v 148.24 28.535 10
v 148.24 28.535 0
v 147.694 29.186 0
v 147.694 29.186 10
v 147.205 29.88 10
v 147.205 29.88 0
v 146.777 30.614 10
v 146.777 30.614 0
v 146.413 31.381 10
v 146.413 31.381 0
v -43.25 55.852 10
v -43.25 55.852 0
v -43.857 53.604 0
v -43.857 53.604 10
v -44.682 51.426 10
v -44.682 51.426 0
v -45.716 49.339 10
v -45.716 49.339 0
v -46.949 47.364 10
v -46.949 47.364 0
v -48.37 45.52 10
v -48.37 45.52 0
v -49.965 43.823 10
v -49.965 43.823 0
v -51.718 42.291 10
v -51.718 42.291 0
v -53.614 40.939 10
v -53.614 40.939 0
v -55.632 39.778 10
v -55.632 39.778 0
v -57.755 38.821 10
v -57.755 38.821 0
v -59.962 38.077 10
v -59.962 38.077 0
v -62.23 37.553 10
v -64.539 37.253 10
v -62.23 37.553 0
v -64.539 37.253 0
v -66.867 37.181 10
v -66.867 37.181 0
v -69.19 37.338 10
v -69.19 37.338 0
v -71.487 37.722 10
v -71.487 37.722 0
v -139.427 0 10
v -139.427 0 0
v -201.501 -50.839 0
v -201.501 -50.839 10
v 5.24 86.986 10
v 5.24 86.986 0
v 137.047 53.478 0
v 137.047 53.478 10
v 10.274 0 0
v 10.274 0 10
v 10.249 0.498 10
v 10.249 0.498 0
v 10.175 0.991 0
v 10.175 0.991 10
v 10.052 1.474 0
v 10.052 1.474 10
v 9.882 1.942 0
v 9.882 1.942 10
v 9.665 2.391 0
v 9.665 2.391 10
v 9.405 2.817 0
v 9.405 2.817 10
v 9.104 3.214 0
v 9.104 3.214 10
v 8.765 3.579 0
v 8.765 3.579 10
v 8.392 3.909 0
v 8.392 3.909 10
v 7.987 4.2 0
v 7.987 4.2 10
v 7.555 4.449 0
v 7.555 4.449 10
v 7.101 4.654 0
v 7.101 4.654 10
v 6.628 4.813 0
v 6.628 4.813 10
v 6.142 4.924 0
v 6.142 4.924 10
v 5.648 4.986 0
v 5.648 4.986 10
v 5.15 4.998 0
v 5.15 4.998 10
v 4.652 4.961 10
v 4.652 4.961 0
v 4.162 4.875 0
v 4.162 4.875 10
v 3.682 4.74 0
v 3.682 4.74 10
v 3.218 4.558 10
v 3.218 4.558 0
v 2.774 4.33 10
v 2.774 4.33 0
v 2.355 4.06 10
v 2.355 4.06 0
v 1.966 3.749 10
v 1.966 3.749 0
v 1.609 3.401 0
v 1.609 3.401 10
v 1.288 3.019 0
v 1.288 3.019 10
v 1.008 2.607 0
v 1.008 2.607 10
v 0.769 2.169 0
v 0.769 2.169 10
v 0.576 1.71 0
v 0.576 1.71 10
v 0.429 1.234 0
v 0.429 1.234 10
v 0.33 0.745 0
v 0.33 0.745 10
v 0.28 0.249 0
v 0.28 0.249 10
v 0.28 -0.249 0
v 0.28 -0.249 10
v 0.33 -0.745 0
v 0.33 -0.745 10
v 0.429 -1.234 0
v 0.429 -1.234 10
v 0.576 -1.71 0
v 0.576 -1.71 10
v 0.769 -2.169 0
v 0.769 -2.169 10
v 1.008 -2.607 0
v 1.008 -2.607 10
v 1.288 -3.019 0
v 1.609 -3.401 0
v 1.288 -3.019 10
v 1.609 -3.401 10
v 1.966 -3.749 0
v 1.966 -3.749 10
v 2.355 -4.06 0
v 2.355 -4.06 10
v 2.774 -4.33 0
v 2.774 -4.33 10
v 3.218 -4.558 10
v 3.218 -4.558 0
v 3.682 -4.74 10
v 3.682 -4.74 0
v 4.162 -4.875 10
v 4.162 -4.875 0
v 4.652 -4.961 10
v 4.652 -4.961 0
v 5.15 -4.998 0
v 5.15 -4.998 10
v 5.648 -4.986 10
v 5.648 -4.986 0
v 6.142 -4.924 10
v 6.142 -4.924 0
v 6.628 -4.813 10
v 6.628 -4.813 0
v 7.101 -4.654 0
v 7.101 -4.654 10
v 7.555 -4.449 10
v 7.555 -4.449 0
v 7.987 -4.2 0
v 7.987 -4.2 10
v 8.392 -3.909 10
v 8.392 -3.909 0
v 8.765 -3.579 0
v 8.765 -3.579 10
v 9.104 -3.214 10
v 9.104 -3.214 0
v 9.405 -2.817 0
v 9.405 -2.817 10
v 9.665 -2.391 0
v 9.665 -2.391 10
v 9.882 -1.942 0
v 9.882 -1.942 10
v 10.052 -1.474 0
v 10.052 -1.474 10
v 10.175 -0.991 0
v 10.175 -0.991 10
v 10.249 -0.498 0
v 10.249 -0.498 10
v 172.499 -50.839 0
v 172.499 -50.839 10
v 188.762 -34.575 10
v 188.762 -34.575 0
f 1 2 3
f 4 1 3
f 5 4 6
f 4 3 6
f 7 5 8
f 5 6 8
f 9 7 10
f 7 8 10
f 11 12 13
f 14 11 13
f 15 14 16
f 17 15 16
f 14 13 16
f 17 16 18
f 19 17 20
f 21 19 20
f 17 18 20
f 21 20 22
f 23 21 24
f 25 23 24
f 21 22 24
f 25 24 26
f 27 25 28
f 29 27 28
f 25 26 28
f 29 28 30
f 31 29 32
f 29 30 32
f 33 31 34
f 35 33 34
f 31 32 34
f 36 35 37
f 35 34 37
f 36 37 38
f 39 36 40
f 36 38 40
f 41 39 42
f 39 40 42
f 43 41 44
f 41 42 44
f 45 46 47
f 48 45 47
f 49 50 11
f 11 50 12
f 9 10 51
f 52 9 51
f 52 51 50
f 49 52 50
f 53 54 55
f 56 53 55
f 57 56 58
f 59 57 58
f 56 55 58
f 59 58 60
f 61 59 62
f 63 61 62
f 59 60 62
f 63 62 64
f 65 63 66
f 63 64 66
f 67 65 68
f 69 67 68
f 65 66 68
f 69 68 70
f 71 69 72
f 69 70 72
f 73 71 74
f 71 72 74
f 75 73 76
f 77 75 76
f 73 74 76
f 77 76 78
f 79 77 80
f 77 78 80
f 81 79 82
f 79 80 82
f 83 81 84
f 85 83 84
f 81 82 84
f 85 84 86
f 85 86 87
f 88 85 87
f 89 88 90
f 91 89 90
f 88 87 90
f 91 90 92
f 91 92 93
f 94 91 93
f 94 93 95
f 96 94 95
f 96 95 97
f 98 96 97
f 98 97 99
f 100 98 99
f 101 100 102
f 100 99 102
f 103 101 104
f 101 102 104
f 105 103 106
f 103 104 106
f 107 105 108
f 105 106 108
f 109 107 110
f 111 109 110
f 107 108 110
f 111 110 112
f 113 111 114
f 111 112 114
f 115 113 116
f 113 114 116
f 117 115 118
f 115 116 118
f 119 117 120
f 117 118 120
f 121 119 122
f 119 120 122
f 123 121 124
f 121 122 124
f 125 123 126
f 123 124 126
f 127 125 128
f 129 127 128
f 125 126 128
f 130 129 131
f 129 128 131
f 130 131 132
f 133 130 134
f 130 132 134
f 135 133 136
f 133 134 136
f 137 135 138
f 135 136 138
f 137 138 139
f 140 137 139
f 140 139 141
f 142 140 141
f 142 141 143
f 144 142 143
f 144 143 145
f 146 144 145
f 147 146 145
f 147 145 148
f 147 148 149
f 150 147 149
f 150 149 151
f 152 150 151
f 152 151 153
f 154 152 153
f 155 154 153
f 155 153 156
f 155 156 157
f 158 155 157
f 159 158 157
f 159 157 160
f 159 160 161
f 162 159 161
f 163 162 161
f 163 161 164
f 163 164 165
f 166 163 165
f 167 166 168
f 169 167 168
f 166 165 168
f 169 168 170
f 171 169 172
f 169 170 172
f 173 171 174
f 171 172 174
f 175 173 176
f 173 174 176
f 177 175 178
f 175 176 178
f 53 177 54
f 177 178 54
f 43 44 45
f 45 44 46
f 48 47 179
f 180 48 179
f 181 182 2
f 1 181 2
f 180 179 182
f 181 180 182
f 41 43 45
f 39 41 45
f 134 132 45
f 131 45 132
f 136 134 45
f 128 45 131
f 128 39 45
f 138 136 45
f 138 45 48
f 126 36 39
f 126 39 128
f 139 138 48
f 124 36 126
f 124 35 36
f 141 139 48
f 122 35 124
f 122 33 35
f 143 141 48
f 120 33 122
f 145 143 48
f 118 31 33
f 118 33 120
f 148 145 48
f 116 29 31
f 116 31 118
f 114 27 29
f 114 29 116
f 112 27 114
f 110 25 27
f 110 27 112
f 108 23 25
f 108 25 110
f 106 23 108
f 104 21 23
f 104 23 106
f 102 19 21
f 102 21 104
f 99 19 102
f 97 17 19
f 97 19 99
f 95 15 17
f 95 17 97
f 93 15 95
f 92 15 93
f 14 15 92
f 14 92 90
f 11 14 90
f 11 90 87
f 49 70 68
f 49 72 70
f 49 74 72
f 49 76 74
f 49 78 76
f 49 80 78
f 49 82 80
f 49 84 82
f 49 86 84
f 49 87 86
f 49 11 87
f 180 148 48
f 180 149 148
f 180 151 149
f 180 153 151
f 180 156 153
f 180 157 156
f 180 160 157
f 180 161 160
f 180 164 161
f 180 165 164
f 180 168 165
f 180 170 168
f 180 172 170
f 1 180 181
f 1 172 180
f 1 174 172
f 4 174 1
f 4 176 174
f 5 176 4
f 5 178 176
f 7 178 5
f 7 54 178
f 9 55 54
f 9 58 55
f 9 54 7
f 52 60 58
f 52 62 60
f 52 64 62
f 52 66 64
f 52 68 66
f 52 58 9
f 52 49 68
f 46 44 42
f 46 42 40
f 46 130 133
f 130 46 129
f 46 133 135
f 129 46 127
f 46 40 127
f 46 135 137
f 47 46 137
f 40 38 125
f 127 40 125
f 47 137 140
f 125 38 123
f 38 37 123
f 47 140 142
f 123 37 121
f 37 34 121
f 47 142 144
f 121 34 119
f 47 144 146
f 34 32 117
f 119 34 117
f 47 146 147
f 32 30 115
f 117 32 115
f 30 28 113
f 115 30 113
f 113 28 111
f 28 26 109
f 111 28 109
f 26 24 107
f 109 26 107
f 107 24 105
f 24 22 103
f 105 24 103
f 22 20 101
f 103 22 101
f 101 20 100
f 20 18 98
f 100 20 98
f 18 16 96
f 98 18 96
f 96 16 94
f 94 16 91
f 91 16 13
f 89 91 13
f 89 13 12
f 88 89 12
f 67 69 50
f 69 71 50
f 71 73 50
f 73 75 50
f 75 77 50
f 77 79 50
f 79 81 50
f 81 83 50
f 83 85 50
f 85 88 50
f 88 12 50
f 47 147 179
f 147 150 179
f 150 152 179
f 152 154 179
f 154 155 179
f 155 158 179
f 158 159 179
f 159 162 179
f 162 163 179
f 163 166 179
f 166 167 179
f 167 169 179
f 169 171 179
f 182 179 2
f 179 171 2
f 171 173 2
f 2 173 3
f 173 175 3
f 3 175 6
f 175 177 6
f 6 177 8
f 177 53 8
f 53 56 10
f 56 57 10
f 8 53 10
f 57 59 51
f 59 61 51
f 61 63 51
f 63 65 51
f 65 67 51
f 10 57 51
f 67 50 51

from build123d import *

# Parameters (mm, degrees)
BOSS_EXTRUDE1_DEPTH = 10
SKETCH2_R           = 5
CUT_EXTRUDE1_DEPTH  = 10


with BuildPart() as part:
    # Sketch1 → Boss-Extrude1 (new body)
    with BuildSketch(Plane.XY):
        with BuildLine():
            Line((-201.501450472, -50.838763567), (172.498549528, -50.838763567))
            Line((172.498549528, -50.838763567), (188.762005495, -34.5753076))
            Line((188.762005495, -34.5753076), (148.240026218, 28.535461651))
            ThreePointArc((148.240026218, 28.535461651), (147.2053445, 29.880442481), (146.412969402, 31.381002841))
            Line((146.412969402, 31.381002841), (137.047280897, 53.478149236))
            Line((137.047280897, 53.478149236), (5.239743471, 86.985955455))
            Line((5.239743471, 86.985955455), (-43.250387022, 55.851553414))
            ThreePointArc((-43.250387022, 55.851553414), (-53.613723576, 40.938672068), (-71.486708656, 37.721658093))
            Line((-71.486708656, 37.721658093), (-139.427338947, 0))
            Line((-139.427338947, 0), (-201.501450472, -50.838763567))
        make_face()
    extrude(amount=BOSS_EXTRUDE1_DEPTH)

    # Sketch2 → Cut-Extrude1 (cut)
    with BuildSketch(Plane.XY.offset(10)):
        with Locations((5.274158071, 0)):
            Circle(SKETCH2_R)
    extrude(amount=-CUT_EXTRUDE1_DEPTH, mode=Mode.SUBTRACT)


solid = part.part
